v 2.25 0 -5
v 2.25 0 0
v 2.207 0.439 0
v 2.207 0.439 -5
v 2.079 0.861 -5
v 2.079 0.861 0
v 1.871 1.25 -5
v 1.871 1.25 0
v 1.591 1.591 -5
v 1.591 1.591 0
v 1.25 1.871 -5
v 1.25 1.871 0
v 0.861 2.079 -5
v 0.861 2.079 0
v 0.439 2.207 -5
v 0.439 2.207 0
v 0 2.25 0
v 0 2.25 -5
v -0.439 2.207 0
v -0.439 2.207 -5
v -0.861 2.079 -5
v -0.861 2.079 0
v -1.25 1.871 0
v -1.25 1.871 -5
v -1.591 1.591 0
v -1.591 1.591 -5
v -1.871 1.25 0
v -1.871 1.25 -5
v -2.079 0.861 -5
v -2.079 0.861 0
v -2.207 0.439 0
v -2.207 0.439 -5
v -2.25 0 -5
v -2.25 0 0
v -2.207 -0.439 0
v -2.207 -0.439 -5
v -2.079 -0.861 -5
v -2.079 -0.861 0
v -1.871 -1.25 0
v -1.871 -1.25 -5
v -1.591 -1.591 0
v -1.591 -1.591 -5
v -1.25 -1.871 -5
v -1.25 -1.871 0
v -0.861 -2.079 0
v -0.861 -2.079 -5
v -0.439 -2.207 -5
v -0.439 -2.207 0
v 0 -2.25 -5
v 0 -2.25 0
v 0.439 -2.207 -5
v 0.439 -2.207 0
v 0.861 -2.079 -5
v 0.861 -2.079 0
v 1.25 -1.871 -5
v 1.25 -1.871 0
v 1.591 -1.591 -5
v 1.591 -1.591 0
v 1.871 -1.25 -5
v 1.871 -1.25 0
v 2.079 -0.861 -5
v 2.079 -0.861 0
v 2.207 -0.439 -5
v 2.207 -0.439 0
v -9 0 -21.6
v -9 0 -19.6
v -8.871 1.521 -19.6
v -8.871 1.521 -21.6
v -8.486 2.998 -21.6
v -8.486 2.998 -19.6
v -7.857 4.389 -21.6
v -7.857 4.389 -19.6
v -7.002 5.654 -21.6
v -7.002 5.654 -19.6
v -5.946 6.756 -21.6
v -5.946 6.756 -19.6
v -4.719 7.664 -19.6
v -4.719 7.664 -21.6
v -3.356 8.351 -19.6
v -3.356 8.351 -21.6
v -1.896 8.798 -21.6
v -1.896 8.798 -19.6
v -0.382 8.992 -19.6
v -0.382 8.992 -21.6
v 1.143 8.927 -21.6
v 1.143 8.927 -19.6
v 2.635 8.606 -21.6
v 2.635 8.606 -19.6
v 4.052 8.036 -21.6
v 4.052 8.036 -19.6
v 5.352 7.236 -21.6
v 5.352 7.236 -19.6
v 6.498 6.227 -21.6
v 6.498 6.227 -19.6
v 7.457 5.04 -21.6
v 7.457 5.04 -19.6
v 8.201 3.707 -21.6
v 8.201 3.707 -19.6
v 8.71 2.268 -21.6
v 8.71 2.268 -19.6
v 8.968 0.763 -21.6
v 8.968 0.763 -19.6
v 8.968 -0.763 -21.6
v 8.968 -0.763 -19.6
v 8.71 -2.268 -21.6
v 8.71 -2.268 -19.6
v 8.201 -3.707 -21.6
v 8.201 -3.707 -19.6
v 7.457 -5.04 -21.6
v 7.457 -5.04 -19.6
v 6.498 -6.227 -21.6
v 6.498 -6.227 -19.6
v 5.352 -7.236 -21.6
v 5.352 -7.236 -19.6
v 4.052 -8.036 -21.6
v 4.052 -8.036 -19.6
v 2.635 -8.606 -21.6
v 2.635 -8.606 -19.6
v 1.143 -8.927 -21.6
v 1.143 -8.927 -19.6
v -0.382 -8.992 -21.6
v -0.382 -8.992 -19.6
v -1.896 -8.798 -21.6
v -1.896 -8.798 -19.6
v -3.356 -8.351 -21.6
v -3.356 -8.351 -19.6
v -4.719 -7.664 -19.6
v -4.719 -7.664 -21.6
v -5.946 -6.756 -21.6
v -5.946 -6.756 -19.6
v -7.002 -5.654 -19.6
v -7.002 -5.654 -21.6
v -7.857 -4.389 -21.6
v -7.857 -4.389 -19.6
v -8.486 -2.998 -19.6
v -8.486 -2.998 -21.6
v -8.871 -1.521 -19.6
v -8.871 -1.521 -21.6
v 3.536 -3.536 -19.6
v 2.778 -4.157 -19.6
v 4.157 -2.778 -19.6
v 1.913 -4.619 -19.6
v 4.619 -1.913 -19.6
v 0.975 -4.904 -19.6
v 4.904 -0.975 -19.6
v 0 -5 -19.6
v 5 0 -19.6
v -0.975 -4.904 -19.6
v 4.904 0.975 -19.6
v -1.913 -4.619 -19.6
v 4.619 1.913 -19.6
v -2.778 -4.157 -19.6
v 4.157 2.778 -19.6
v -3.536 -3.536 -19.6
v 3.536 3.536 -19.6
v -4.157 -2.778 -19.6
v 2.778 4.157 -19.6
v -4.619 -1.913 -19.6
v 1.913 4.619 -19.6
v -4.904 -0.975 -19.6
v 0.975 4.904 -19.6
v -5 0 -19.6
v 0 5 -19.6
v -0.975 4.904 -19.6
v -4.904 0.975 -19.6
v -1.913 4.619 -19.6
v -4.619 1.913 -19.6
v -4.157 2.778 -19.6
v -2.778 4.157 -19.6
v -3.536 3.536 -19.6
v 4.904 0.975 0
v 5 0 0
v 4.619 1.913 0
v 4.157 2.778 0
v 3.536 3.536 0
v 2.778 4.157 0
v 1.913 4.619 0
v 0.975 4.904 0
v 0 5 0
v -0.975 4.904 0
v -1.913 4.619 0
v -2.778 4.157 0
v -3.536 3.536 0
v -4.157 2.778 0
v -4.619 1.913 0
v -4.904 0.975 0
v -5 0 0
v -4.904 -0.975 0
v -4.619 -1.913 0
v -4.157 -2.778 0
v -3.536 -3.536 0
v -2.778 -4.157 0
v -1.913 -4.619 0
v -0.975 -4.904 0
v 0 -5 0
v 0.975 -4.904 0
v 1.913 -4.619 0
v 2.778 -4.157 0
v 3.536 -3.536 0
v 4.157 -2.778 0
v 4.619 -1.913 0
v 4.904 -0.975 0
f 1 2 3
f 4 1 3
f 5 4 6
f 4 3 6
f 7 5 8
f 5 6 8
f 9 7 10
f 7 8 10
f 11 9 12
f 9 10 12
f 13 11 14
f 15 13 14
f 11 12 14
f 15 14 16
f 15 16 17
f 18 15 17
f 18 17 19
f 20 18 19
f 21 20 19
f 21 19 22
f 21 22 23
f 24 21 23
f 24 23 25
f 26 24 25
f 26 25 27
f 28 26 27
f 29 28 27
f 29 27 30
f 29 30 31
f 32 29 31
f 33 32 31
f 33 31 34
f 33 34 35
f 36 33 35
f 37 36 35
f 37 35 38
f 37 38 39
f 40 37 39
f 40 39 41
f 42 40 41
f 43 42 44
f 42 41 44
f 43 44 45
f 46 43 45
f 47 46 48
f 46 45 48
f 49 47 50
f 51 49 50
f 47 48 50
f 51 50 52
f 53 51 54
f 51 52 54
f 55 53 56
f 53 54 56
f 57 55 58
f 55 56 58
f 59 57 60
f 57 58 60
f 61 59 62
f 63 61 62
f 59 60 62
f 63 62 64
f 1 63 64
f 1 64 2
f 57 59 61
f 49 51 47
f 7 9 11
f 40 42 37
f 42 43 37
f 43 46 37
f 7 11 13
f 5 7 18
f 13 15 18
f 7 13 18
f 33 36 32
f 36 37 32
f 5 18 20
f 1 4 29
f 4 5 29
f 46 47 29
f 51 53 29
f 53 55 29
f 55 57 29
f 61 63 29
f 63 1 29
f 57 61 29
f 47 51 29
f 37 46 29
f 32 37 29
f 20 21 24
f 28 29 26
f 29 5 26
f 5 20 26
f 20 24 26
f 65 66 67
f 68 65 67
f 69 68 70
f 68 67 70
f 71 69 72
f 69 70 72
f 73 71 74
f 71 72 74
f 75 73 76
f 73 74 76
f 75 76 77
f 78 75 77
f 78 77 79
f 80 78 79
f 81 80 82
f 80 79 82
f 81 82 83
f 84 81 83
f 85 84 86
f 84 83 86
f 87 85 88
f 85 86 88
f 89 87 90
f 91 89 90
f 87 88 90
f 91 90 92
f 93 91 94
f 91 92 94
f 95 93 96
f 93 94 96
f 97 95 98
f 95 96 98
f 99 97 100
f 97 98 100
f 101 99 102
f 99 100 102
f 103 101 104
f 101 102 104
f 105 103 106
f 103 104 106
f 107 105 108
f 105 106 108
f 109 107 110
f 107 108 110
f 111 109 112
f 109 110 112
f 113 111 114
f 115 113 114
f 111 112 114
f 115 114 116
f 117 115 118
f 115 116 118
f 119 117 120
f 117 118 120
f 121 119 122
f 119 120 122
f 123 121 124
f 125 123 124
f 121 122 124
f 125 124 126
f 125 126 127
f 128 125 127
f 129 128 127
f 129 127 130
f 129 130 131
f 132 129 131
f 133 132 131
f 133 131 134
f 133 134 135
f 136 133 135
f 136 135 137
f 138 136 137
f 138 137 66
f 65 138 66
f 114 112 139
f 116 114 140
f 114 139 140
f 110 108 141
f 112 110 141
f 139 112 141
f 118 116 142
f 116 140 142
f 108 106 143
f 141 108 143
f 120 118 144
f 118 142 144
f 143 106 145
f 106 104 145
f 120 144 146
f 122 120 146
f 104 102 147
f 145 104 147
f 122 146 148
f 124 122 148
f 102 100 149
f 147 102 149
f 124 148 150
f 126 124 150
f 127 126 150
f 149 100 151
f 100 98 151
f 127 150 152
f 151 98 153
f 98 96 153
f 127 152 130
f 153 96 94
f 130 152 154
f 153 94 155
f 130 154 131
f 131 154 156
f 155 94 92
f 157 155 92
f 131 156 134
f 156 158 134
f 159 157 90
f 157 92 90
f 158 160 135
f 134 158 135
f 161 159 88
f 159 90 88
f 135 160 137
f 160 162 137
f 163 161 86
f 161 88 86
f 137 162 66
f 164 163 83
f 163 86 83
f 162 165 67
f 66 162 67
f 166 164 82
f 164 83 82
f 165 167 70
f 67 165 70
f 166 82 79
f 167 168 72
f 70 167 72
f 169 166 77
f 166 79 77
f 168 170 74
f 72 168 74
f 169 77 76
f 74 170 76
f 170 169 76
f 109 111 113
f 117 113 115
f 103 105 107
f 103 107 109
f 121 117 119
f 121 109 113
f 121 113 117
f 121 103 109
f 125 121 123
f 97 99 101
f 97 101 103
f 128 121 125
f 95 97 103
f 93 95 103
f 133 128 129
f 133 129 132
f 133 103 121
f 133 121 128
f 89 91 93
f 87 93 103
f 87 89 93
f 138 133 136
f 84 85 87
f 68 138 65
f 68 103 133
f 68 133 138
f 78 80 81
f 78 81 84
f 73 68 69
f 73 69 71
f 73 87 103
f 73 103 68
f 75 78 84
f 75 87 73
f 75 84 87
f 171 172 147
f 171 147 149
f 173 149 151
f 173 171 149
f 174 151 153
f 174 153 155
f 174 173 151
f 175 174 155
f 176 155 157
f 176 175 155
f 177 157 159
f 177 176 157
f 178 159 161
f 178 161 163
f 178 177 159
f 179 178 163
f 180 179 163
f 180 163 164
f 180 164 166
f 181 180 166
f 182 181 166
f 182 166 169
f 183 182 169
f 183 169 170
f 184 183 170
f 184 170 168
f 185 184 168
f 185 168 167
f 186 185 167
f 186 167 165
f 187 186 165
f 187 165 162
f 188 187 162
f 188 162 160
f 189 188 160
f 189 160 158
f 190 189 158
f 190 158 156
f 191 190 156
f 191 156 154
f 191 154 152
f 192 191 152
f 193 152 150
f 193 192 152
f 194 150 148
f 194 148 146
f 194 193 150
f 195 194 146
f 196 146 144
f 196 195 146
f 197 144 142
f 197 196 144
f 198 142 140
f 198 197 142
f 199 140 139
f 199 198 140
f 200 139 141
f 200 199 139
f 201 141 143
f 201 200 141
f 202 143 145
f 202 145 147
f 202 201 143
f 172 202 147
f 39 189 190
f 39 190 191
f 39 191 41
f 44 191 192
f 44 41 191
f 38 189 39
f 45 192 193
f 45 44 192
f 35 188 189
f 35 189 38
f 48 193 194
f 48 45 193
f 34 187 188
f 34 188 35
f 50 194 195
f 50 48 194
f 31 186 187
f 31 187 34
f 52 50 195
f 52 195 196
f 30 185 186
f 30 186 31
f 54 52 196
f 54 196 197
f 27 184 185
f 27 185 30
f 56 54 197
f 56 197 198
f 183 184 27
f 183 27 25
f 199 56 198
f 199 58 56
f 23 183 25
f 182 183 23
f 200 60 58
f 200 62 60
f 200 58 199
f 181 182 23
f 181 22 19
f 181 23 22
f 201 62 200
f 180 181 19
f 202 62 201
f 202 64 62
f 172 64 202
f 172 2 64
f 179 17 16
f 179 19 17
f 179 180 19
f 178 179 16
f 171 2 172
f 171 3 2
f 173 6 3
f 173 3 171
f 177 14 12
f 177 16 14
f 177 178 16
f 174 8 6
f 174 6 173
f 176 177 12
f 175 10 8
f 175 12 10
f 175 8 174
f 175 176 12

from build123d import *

# Parameters (mm, degrees)
CROQUIS1_R              = 5
CROQUIS1_R_2            = 4.25
SALIENTE_EXTRUIR1_DEPTH = 19.6
CROQUIS2_R              = 9
CROQUIS2_R_2            = 4.25
SALIENTE_EXTRUIR2_DEPTH = 2
CROQUIS3_R              = 5
SALIENTE_EXTRUIR3_DEPTH = 5
CROQUIS4_R              = 2.25
CORTAR_EXTRUIR1_DEPTH   = 6
SALIENTE_EXTRUIR4_START = -16.6
CROQUIS5_R              = 4.25
SALIENTE_EXTRUIR4_DEPTH = 16.6


with BuildPart() as part:
    # Croquis1 → Saliente-Extruir1 (new body)
    with BuildSketch(Plane.XY):
        Circle(CROQUIS1_R)
        Circle(CROQUIS1_R_2, mode=Mode.SUBTRACT)
    extrude(amount=-SALIENTE_EXTRUIR1_DEPTH)

    # Croquis2 → Saliente-Extruir2 (add)
    with BuildSketch(Plane(origin=(0, 0, -19.6), x_dir=(-1, 0, 0), z_dir=(0, 0, -1))):
        Circle(CROQUIS2_R)
        with Locations(Location((0, 0, 0), (0, 0, 180))):
            Circle(CROQUIS2_R_2, mode=Mode.SUBTRACT)
    extrude(amount=SALIENTE_EXTRUIR2_DEPTH)

    # Croquis3 → Saliente-Extruir3 (add)
    with BuildSketch(Plane.XY):
        Circle(CROQUIS3_R)
    extrude(amount=-SALIENTE_EXTRUIR3_DEPTH)

    # Croquis4 → Cortar-Extruir1 (cut)
    with BuildSketch(Plane.XY):
        Circle(CROQUIS4_R)
    extrude(amount=-CORTAR_EXTRUIR1_DEPTH, mode=Mode.SUBTRACT)

    # Croquis5 → Saliente-Extruir4 (add)
    with BuildSketch(Plane(origin=(0, 0, -21.6), x_dir=(-1, 0, 0), z_dir=(0, 0, -1)).offset(SALIENTE_EXTRUIR4_START)):
        Circle(CROQUIS5_R)
    extrude(amount=SALIENTE_EXTRUIR4_DEPTH)


solid = part.part
